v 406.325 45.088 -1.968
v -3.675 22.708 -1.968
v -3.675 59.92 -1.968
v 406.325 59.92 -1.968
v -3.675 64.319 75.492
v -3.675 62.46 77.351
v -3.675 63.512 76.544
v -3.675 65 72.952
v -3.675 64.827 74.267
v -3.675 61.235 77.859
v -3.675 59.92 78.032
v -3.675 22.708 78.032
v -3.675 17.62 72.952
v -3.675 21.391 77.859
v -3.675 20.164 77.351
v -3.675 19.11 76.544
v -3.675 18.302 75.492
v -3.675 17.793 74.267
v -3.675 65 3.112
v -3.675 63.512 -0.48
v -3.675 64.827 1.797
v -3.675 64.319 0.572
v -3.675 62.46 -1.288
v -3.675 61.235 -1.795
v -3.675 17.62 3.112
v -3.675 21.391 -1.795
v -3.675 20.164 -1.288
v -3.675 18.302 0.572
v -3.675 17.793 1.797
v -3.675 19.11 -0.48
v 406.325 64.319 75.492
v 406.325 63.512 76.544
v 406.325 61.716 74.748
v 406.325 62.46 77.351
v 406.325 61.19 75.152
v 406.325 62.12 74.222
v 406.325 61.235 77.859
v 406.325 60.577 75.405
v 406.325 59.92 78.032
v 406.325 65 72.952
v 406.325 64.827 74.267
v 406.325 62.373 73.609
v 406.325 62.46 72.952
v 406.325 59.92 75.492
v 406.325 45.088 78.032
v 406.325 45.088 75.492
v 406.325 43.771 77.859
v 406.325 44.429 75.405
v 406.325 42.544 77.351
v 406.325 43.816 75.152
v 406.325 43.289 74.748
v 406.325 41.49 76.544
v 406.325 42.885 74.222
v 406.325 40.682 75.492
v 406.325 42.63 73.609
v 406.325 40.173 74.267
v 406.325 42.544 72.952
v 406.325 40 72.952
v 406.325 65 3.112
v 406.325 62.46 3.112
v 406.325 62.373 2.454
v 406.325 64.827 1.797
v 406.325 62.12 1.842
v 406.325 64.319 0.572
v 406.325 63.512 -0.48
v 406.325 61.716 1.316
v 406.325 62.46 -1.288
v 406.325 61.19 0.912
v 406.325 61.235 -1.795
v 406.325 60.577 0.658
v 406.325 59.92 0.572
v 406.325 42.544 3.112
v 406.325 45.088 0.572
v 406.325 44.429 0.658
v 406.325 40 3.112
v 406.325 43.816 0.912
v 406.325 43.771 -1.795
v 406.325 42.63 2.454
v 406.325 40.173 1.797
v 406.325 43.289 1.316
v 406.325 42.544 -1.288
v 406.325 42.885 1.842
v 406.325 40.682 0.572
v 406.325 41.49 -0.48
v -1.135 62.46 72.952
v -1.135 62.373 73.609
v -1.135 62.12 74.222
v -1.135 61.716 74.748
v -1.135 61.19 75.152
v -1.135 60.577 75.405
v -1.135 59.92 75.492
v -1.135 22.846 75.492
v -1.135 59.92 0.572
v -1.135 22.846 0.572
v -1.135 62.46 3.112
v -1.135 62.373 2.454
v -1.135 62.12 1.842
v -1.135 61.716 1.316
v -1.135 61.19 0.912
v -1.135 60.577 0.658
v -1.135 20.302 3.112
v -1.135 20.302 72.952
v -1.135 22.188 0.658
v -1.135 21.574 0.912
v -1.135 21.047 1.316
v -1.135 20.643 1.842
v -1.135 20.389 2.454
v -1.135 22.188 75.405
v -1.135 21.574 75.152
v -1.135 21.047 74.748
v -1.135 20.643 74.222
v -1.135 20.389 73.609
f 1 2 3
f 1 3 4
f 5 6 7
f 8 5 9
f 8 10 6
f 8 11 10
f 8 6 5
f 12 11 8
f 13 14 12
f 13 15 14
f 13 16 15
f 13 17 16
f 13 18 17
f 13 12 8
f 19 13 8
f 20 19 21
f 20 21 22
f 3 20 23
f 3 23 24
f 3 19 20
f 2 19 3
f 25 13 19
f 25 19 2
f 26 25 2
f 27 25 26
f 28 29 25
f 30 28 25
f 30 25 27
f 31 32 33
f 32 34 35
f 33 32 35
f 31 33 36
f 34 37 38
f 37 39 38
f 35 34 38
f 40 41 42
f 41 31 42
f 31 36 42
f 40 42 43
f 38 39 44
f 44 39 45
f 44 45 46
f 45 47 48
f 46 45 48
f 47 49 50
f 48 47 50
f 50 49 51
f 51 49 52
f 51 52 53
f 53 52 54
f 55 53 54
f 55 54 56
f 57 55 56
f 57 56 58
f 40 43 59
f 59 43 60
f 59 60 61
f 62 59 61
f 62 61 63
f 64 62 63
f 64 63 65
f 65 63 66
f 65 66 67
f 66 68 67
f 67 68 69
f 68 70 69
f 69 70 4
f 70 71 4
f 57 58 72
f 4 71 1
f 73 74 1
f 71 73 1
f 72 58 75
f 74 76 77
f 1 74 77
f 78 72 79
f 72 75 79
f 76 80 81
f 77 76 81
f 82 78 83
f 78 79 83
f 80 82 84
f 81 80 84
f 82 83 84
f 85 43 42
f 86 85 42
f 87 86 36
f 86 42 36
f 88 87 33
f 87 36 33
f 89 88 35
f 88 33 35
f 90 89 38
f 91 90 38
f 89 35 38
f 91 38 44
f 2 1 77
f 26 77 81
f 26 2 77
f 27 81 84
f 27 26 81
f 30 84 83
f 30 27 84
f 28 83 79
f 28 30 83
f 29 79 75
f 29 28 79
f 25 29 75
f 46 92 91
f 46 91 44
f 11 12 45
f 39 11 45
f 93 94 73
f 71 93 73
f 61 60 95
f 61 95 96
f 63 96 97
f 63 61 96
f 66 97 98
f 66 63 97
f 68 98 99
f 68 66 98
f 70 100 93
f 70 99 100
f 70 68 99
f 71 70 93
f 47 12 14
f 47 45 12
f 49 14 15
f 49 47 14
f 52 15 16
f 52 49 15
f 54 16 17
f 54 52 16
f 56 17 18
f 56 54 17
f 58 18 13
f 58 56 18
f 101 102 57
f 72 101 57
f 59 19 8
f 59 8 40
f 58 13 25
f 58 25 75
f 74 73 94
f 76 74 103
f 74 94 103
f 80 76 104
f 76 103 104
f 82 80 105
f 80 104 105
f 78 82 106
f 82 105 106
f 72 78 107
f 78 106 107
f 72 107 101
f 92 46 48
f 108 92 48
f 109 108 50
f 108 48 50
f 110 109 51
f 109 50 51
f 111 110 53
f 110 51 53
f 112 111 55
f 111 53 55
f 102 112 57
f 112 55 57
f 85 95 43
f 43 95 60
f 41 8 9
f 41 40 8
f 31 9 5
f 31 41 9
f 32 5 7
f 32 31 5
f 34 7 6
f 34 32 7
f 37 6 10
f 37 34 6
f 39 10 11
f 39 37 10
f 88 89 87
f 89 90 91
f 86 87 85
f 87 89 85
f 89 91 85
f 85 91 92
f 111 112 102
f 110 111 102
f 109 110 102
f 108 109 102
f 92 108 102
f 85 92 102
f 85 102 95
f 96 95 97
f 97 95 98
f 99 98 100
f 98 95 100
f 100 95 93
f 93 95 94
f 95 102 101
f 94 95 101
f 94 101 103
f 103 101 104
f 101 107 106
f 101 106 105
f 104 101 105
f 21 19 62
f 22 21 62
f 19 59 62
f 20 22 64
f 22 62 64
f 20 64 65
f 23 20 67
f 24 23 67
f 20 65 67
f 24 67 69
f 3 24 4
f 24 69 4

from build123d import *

# Parameters (mm, degrees)
SKETCH1_W           = 410
SKETCH1_H           = 80.00000002
BOSS_EXTRUDE1_DEPTH = 65
CUT_EXTRUDE1_DEPTH  = 96.52
FILLET1_R           = 5.08
FILLET2_R           = 5.08
FILLET3_R           = 5.08
FILLET4_R           = 5.08
SHELL2_T            = -2.54


with BuildPart() as part:
    # Sketch1 → Boss-Extrude1 (new body)
    with BuildSketch(Plane(origin=(0, 0, 0), x_dir=(1, 0, 0), z_dir=(0, 1, 0))):
        with Locations((201.324966403, -38.031873554)):
            Rectangle(SKETCH1_W, SKETCH1_H)
    extrude(amount=BOSS_EXTRUDE1_DEPTH)

    # Sketch3 → Cut-Extrude1 (cut)
    with BuildSketch(Plane.XY.offset(78.031873564)):
        Polygon((-3.675033597, 17.620000018), (406.324966403, 40), (452.471299635, -78.145402135), (-12.284026323, -65.583685792), (-43.531224316, 90.933184559), align=None)
    extrude(amount=-CUT_EXTRUDE1_DEPTH, mode=Mode.SUBTRACT)

    # Fillet1
    fillet1_edges = [part.edges().sort_by_distance(p)[0] for p in [
        (201.324966403, 65, 78.031873564),
    ]]
    fillet(fillet1_edges, radius=FILLET1_R)

    # Fillet2
    fillet2_edges = [part.edges().sort_by_distance(p)[0] for p in [
        (201.324966403, 28.810000009, 78.031873564),
    ]]
    fillet(fillet2_edges, radius=FILLET2_R)

    # Fillet3
    fillet3_edges = [part.edges().sort_by_distance(p)[0] for p in [
        (201.324966403, 65, -1.968126456),
    ]]
    fillet(fillet3_edges, radius=FILLET3_R)

    # Fillet4
    fillet4_edges = [part.edges().sort_by_distance(p)[0] for p in [
        (201.324966403, 28.810000009, -1.968126456),
    ]]
    fillet(fillet4_edges, radius=FILLET4_R)

    # Shell2
    shell2_openings = [part.faces().sort_by_distance(p)[0] for p in [
        (406.324966403, 52.501499056, 38.031873554),
    ]]
    offset(amount=SHELL2_T, openings=shell2_openings, kind=Kind.INTERSECTION)


solid = part.part
